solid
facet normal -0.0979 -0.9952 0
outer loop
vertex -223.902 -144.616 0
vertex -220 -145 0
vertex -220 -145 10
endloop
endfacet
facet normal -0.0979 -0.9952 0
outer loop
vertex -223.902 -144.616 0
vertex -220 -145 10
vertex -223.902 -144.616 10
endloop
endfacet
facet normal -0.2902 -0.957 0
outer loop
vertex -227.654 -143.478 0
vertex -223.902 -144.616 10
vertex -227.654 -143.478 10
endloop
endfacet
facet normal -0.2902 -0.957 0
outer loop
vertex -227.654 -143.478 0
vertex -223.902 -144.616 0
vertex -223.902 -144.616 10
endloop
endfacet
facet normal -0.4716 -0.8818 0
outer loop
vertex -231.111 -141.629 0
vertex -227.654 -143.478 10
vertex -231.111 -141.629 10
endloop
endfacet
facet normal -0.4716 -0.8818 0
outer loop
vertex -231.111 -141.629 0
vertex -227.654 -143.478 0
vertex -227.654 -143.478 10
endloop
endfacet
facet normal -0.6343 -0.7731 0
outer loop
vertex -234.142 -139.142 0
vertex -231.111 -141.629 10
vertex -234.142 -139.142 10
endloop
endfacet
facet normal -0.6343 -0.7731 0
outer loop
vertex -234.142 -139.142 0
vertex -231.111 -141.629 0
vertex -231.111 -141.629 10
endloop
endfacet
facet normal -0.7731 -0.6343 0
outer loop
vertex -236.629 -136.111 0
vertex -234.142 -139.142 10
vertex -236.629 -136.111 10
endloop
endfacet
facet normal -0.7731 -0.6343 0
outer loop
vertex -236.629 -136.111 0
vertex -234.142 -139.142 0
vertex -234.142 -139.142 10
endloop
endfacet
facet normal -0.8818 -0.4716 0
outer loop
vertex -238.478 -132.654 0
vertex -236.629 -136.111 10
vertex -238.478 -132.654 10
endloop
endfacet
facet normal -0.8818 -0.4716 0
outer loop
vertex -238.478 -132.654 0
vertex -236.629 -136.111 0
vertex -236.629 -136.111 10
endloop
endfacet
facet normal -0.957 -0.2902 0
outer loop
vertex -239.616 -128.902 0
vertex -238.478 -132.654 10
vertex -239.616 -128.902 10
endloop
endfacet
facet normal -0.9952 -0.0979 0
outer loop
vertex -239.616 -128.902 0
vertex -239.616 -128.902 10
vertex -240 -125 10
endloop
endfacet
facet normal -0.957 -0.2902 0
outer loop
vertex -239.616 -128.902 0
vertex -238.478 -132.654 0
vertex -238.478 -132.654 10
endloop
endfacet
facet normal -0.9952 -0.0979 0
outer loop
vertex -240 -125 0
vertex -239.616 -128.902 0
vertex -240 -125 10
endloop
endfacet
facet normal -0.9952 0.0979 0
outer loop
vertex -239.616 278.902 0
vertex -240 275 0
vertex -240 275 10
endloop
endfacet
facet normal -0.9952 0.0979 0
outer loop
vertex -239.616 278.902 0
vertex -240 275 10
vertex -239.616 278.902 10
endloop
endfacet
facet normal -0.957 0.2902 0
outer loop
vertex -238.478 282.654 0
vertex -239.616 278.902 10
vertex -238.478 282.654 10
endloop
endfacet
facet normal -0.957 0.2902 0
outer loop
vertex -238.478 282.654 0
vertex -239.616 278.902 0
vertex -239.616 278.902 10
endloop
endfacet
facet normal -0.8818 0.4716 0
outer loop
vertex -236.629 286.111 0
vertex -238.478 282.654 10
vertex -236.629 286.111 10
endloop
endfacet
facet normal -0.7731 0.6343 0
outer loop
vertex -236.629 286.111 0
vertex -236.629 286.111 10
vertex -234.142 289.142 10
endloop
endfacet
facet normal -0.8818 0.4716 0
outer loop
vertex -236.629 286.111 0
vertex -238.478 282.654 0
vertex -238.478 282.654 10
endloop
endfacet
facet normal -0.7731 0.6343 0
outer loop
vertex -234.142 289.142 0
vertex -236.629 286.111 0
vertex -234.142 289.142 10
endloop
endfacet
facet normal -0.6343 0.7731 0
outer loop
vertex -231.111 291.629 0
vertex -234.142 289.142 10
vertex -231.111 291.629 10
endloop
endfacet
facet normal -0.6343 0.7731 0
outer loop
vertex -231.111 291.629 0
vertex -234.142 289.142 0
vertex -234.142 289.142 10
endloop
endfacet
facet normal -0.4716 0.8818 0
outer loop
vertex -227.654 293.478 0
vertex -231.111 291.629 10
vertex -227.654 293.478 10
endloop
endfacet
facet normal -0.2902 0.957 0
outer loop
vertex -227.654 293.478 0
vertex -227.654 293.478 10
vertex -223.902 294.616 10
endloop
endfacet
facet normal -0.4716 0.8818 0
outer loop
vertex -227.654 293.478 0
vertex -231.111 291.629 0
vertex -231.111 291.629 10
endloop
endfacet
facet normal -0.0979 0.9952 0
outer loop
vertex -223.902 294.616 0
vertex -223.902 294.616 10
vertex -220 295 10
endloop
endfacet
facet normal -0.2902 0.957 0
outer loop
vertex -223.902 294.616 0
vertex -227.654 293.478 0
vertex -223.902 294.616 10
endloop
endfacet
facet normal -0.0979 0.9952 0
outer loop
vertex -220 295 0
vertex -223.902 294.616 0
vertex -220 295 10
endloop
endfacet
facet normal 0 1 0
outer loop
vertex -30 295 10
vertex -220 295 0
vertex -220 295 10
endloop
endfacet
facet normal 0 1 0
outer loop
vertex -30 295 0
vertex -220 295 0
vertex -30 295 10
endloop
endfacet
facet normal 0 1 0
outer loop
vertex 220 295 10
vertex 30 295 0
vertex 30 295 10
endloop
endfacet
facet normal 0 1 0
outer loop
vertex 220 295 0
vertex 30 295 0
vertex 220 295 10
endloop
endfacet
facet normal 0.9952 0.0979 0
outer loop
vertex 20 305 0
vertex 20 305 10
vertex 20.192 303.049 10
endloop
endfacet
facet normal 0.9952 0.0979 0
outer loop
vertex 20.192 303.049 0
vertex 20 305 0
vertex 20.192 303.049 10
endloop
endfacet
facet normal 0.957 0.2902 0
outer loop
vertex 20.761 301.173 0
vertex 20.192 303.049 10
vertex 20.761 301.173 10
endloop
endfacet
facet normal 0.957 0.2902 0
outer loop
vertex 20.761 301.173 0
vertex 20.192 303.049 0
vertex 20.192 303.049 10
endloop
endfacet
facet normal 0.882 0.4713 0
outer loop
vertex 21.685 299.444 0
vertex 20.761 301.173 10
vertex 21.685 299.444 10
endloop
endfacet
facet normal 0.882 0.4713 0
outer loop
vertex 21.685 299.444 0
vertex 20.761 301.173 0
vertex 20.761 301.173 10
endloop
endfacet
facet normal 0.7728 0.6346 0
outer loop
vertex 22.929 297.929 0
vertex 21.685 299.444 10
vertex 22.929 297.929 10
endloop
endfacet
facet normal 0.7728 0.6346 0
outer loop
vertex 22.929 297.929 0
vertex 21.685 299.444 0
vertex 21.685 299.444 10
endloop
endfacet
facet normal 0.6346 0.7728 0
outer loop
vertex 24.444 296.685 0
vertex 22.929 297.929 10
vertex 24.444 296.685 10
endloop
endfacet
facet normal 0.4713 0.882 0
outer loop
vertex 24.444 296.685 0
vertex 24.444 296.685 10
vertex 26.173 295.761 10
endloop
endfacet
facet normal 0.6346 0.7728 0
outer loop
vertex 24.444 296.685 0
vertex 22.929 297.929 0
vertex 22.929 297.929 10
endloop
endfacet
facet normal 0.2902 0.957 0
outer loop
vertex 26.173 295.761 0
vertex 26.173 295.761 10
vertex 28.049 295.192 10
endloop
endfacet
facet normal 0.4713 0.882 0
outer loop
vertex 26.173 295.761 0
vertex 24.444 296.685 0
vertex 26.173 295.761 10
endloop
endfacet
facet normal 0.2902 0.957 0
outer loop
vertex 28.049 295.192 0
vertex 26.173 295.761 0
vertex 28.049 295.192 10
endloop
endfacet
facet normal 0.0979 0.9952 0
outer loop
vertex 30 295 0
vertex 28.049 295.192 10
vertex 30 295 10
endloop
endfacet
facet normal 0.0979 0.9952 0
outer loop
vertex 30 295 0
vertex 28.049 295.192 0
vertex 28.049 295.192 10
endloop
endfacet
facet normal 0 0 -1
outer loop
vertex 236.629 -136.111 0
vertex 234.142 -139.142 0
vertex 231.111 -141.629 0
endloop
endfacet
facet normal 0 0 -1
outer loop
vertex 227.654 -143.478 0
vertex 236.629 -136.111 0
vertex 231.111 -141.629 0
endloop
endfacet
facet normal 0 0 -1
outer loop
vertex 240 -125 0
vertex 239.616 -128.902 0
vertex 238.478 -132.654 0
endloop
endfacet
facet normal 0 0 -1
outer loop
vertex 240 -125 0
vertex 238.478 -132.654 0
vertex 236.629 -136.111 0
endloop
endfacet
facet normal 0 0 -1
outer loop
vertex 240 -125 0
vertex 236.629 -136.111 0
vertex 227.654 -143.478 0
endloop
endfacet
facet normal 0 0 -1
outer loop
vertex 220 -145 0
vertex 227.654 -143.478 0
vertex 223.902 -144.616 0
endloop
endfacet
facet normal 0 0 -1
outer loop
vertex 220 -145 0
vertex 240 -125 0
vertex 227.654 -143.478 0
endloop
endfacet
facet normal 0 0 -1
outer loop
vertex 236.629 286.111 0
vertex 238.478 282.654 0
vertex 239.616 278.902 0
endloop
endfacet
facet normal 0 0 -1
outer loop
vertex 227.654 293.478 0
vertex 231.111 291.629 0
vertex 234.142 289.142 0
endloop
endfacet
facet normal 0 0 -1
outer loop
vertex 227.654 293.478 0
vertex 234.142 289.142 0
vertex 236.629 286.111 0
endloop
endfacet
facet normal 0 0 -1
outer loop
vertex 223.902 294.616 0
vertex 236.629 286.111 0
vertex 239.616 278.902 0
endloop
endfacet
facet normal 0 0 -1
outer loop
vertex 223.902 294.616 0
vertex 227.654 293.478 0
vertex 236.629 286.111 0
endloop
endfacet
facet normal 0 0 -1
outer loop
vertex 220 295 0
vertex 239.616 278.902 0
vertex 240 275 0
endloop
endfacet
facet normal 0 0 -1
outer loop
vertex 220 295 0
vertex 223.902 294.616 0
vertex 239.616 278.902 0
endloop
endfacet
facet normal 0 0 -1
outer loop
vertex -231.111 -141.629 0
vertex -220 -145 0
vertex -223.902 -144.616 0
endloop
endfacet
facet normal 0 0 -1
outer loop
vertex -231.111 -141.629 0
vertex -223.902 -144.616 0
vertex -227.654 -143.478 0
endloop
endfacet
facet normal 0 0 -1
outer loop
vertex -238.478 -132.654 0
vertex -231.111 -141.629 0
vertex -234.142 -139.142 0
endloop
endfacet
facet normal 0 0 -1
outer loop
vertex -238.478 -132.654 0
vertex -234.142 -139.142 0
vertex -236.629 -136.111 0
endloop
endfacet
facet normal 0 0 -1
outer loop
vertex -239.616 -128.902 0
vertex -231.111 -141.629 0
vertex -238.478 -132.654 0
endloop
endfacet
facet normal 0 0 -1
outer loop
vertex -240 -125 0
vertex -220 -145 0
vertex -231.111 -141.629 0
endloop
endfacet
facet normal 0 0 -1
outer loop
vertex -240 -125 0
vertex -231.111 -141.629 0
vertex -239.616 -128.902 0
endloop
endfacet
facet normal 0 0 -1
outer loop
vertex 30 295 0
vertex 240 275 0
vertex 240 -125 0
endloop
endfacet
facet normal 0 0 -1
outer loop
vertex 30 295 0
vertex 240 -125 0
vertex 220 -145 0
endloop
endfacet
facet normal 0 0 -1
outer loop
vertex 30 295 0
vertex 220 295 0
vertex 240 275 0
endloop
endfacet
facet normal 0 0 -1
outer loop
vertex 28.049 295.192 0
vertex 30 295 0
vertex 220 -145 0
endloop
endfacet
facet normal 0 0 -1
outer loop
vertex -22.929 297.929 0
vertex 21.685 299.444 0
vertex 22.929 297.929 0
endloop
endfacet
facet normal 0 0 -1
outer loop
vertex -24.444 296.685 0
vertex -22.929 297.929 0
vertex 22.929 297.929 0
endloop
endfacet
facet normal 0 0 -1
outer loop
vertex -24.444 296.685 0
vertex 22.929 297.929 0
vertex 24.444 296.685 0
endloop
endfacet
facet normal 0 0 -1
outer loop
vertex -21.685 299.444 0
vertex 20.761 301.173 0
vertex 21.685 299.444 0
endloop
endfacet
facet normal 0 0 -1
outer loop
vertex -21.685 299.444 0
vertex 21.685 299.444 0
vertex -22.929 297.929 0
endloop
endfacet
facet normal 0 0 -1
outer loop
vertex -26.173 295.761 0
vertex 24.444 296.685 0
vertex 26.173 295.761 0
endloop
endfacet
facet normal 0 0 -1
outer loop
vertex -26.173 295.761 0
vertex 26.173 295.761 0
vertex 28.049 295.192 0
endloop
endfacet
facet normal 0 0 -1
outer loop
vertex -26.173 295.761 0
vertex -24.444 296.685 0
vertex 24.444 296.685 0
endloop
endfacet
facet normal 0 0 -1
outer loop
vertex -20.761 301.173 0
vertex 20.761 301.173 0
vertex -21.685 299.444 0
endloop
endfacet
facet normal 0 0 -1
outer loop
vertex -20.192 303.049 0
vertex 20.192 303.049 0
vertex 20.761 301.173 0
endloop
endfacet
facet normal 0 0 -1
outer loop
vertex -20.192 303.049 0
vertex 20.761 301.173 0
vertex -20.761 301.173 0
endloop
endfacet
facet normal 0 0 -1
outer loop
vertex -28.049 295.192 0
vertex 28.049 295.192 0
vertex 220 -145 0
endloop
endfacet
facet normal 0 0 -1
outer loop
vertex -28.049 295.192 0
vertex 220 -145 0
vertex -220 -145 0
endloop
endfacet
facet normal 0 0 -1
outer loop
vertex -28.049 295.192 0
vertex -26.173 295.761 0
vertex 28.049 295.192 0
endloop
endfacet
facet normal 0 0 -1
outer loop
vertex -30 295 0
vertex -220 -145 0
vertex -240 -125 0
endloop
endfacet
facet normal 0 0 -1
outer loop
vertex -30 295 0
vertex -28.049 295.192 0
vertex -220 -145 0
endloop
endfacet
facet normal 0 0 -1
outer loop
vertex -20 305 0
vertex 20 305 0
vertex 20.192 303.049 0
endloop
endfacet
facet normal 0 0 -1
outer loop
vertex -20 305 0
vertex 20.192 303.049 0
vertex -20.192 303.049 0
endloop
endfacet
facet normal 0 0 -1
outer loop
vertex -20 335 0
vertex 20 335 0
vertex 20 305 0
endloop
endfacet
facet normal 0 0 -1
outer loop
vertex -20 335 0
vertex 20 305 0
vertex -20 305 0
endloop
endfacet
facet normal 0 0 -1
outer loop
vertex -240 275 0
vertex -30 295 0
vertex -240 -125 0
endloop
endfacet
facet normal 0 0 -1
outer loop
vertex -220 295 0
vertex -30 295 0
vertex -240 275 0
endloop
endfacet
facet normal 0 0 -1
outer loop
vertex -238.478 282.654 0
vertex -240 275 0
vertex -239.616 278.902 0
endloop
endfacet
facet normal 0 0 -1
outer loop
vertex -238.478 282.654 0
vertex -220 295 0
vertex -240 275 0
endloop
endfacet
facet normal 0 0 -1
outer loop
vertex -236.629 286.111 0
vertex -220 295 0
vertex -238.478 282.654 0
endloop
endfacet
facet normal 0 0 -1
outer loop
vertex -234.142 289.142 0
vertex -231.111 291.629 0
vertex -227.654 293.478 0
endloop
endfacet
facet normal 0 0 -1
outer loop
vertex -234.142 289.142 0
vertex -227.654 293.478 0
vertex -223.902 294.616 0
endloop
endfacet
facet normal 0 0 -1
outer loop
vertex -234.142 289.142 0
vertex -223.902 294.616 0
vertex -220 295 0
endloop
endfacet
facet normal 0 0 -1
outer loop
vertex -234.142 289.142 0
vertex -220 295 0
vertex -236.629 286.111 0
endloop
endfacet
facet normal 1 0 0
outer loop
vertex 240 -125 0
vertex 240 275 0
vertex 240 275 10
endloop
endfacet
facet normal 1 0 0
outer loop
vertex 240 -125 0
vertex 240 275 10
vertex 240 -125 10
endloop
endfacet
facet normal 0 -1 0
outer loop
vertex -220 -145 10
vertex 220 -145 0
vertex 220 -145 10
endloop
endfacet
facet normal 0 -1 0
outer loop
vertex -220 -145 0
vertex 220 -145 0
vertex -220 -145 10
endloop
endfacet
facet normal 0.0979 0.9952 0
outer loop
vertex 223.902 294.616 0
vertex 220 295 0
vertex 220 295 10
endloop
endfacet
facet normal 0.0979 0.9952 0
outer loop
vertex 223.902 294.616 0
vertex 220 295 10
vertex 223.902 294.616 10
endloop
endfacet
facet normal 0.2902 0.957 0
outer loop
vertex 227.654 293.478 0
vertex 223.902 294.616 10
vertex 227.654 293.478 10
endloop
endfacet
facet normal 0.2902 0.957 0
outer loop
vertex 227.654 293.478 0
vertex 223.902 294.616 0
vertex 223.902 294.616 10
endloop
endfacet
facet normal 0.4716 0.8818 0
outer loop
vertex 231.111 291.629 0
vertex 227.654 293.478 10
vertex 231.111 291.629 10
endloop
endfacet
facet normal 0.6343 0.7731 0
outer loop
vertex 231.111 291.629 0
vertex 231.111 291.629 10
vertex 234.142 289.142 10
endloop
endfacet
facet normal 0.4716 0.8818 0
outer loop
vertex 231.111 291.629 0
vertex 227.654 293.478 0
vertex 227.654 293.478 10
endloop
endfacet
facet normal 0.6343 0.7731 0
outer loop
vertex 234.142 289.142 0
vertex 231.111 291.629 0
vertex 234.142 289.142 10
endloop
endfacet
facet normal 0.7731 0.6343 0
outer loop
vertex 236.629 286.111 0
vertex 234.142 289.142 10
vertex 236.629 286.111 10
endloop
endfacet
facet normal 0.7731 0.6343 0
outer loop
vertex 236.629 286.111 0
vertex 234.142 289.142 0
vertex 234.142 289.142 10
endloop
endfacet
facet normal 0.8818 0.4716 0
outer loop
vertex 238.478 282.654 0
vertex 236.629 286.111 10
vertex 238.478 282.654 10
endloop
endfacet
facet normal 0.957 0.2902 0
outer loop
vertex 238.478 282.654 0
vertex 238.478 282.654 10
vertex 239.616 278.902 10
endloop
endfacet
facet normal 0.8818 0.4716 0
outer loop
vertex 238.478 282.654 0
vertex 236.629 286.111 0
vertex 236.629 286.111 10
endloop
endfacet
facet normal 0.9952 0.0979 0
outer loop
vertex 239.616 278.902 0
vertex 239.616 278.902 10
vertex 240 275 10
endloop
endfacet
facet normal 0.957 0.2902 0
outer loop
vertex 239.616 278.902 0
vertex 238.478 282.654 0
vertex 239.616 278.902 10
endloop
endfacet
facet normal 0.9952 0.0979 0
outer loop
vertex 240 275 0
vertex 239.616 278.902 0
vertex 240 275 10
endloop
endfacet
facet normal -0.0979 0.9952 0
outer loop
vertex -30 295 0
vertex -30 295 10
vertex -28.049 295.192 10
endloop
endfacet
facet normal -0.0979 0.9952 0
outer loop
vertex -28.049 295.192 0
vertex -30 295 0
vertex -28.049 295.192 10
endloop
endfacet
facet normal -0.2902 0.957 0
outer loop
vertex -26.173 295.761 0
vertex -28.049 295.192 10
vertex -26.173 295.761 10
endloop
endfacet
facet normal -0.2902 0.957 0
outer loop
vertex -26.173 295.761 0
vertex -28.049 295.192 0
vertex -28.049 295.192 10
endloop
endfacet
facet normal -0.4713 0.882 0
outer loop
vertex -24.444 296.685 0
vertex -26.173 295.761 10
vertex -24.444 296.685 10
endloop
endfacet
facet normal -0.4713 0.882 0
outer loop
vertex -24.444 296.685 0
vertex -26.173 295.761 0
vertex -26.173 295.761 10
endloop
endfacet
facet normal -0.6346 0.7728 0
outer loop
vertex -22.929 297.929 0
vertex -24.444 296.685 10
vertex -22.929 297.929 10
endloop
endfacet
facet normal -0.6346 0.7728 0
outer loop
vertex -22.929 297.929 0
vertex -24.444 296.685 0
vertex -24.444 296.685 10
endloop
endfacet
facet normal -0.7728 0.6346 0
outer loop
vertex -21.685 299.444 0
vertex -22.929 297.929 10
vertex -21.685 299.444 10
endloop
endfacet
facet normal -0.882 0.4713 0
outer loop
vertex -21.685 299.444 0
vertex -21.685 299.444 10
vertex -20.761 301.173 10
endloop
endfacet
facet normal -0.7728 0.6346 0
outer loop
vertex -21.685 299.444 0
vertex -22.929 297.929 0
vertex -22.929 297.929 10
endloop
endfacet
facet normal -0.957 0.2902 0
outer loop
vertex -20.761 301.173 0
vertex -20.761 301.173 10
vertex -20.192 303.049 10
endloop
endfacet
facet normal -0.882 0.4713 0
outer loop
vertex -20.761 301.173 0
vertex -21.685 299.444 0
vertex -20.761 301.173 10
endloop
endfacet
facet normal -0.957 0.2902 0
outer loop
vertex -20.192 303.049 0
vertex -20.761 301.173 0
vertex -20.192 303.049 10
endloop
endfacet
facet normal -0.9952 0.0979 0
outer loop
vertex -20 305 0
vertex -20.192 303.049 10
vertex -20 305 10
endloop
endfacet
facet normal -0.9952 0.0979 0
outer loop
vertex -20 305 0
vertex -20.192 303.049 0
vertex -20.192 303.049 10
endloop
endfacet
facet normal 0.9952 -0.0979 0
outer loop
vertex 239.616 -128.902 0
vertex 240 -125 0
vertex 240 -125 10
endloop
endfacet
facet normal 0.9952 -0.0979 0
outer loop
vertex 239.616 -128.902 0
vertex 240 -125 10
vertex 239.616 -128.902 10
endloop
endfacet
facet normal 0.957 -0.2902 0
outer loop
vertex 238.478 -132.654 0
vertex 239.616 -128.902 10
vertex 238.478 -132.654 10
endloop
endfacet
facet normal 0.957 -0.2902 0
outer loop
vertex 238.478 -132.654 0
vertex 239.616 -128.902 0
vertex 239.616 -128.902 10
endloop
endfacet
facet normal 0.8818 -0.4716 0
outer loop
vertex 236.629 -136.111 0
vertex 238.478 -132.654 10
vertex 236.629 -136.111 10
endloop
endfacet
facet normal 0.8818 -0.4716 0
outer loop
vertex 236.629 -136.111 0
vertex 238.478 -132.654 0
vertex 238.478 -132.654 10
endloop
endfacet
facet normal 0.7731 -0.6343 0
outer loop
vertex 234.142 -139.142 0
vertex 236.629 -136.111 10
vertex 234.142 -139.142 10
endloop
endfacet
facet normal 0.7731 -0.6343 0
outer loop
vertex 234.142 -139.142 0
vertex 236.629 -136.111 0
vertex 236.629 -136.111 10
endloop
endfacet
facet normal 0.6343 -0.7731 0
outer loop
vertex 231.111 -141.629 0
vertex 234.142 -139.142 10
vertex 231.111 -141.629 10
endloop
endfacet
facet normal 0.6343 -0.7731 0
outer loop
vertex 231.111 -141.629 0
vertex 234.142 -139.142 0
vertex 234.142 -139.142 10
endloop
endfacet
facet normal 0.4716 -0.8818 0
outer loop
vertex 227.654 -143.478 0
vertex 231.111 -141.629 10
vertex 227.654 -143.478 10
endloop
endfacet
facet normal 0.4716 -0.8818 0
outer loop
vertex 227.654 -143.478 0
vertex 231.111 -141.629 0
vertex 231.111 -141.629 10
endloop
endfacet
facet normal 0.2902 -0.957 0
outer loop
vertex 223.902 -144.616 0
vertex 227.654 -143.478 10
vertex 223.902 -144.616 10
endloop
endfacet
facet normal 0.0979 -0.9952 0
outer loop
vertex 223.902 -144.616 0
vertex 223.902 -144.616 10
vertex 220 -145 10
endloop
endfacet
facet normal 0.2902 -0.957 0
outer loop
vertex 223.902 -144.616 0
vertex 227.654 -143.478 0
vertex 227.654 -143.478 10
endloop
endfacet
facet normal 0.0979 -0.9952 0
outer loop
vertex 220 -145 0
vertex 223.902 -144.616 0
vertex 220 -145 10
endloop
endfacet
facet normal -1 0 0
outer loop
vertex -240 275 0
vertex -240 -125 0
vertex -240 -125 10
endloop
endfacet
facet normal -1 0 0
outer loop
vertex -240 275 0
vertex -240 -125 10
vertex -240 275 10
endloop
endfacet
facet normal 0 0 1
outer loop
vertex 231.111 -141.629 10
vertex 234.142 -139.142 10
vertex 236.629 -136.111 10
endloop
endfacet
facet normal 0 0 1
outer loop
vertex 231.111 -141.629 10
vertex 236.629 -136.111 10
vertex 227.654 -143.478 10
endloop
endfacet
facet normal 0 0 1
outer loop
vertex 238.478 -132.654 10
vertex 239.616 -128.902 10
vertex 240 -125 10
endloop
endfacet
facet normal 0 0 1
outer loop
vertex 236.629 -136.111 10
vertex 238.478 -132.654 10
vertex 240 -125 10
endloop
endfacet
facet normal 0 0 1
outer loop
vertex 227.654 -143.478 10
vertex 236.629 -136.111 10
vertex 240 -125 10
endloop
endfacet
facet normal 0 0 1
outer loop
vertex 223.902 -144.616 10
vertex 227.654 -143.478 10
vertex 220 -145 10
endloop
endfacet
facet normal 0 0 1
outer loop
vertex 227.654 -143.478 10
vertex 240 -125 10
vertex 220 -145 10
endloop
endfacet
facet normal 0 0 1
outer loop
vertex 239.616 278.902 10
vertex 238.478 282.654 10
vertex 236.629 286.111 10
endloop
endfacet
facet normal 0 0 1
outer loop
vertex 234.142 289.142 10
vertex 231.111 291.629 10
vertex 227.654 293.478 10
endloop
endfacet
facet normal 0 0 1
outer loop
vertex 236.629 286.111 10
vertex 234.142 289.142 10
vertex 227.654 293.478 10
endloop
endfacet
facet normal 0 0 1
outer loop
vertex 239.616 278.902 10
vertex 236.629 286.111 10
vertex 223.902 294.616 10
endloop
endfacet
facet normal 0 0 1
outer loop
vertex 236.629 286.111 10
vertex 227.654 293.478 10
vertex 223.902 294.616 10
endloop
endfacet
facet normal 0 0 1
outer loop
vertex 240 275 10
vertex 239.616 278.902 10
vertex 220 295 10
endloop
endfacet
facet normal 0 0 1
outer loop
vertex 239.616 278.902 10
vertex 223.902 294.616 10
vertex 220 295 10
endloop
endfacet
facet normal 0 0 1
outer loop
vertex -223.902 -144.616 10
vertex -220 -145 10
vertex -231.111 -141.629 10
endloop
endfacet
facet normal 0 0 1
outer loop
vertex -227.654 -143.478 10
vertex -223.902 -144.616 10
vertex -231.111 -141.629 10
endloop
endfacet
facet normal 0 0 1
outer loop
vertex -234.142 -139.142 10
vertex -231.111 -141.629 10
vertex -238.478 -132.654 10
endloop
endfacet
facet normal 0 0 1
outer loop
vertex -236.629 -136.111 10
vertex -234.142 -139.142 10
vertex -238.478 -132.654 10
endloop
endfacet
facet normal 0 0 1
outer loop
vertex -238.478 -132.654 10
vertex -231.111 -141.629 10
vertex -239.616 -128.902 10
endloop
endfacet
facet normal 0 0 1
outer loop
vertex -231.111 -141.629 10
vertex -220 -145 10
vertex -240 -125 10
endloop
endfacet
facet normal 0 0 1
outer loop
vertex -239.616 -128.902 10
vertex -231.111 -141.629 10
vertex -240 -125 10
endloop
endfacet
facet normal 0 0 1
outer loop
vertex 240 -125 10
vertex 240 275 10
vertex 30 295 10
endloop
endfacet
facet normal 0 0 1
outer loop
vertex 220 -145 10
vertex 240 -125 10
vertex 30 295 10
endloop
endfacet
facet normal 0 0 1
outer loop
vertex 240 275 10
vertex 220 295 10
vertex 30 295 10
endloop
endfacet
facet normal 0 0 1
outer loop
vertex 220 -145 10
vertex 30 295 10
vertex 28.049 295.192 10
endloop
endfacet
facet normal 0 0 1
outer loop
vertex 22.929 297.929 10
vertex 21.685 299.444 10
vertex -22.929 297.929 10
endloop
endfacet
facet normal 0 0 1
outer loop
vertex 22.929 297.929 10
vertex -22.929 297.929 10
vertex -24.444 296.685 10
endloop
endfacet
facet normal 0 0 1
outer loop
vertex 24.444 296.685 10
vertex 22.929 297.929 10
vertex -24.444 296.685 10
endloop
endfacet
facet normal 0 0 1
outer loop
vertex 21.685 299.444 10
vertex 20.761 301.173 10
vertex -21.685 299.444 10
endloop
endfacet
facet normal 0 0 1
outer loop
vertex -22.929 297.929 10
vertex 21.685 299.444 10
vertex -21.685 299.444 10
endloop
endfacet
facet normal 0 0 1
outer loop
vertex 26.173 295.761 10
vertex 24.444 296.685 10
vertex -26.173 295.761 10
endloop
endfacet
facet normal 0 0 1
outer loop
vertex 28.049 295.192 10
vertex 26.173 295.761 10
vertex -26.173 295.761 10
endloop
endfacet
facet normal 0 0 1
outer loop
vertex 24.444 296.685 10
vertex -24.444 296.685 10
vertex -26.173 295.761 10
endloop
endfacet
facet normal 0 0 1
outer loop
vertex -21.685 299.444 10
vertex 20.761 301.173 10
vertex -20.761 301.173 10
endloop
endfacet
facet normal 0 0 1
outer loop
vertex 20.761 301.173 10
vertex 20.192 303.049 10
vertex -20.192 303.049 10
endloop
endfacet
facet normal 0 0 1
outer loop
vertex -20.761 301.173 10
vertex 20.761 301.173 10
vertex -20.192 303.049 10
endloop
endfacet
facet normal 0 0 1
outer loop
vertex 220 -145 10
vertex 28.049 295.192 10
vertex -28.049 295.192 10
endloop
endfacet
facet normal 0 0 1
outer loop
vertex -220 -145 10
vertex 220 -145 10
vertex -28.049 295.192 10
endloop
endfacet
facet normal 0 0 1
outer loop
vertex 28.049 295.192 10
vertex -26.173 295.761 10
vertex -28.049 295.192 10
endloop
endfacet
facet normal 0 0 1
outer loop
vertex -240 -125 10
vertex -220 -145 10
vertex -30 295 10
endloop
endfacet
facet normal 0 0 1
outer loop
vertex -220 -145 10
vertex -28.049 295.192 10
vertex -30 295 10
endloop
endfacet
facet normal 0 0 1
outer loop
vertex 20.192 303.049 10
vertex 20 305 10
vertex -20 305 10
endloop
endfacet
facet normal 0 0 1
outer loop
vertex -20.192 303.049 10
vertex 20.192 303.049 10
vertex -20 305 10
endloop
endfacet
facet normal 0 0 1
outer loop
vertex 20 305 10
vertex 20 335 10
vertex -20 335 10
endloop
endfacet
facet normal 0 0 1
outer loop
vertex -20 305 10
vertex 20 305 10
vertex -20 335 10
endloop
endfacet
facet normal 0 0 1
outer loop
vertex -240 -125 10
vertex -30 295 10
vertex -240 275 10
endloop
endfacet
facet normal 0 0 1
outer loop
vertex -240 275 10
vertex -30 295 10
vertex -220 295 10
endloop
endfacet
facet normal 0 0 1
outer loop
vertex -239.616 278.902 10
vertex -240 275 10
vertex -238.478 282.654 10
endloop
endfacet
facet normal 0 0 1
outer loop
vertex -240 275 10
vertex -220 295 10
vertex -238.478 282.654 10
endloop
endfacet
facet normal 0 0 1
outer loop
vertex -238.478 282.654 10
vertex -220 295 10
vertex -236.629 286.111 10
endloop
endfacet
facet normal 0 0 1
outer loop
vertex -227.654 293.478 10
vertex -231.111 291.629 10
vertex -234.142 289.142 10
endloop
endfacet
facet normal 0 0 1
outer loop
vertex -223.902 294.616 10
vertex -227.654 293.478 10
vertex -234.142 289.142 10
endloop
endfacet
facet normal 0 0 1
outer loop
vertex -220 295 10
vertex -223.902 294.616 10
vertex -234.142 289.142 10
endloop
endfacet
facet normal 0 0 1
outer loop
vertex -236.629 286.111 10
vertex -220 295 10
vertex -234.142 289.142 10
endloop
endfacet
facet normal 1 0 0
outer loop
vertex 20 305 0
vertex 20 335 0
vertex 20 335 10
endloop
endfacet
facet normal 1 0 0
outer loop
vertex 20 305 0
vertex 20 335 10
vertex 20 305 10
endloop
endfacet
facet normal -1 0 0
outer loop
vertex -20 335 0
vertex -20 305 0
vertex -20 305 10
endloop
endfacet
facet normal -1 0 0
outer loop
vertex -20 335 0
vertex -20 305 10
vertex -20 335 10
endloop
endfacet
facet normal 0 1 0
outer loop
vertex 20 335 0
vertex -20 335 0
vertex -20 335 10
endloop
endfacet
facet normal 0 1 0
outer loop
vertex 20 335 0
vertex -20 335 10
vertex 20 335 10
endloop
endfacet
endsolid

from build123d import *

# Parameters (mm, degrees)
BOSS_EXTRU_1_DEPTH = 10


with BuildPart() as part:
    # Esquisse1 → Boss.-Extru.1 (new body)
    with BuildSketch(Plane.XY):
        with BuildLine():
            Line((-220, 295), (-30, 295))
            ThreePointArc((-30, 295), (-22.928932188, 297.928932188), (-20, 305))
            Line((-20, 305), (-20, 335))
            Line((-20, 335), (20, 335))
            Line((20, 335), (20, 305))
            ThreePointArc((20, 305), (22.928932188, 297.928932188), (30, 295))
            Line((30, 295), (220, 295))
            ThreePointArc((220, 295), (234.142135624, 289.142135624), (240, 275))
            Line((240, 275), (240, -125))
            ThreePointArc((240, -125), (234.142135624, -139.142135624), (220, -145))
            Line((220, -145), (-220, -145))
            ThreePointArc((-220, -145), (-234.142135624, -139.142135624), (-240, -125))
            Line((-240, -125), (-240, 275))
            ThreePointArc((-240, 275), (-234.142135624, 289.142135624), (-220, 295))
        make_face()
    extrude(amount=BOSS_EXTRU_1_DEPTH)


solid = part.part
